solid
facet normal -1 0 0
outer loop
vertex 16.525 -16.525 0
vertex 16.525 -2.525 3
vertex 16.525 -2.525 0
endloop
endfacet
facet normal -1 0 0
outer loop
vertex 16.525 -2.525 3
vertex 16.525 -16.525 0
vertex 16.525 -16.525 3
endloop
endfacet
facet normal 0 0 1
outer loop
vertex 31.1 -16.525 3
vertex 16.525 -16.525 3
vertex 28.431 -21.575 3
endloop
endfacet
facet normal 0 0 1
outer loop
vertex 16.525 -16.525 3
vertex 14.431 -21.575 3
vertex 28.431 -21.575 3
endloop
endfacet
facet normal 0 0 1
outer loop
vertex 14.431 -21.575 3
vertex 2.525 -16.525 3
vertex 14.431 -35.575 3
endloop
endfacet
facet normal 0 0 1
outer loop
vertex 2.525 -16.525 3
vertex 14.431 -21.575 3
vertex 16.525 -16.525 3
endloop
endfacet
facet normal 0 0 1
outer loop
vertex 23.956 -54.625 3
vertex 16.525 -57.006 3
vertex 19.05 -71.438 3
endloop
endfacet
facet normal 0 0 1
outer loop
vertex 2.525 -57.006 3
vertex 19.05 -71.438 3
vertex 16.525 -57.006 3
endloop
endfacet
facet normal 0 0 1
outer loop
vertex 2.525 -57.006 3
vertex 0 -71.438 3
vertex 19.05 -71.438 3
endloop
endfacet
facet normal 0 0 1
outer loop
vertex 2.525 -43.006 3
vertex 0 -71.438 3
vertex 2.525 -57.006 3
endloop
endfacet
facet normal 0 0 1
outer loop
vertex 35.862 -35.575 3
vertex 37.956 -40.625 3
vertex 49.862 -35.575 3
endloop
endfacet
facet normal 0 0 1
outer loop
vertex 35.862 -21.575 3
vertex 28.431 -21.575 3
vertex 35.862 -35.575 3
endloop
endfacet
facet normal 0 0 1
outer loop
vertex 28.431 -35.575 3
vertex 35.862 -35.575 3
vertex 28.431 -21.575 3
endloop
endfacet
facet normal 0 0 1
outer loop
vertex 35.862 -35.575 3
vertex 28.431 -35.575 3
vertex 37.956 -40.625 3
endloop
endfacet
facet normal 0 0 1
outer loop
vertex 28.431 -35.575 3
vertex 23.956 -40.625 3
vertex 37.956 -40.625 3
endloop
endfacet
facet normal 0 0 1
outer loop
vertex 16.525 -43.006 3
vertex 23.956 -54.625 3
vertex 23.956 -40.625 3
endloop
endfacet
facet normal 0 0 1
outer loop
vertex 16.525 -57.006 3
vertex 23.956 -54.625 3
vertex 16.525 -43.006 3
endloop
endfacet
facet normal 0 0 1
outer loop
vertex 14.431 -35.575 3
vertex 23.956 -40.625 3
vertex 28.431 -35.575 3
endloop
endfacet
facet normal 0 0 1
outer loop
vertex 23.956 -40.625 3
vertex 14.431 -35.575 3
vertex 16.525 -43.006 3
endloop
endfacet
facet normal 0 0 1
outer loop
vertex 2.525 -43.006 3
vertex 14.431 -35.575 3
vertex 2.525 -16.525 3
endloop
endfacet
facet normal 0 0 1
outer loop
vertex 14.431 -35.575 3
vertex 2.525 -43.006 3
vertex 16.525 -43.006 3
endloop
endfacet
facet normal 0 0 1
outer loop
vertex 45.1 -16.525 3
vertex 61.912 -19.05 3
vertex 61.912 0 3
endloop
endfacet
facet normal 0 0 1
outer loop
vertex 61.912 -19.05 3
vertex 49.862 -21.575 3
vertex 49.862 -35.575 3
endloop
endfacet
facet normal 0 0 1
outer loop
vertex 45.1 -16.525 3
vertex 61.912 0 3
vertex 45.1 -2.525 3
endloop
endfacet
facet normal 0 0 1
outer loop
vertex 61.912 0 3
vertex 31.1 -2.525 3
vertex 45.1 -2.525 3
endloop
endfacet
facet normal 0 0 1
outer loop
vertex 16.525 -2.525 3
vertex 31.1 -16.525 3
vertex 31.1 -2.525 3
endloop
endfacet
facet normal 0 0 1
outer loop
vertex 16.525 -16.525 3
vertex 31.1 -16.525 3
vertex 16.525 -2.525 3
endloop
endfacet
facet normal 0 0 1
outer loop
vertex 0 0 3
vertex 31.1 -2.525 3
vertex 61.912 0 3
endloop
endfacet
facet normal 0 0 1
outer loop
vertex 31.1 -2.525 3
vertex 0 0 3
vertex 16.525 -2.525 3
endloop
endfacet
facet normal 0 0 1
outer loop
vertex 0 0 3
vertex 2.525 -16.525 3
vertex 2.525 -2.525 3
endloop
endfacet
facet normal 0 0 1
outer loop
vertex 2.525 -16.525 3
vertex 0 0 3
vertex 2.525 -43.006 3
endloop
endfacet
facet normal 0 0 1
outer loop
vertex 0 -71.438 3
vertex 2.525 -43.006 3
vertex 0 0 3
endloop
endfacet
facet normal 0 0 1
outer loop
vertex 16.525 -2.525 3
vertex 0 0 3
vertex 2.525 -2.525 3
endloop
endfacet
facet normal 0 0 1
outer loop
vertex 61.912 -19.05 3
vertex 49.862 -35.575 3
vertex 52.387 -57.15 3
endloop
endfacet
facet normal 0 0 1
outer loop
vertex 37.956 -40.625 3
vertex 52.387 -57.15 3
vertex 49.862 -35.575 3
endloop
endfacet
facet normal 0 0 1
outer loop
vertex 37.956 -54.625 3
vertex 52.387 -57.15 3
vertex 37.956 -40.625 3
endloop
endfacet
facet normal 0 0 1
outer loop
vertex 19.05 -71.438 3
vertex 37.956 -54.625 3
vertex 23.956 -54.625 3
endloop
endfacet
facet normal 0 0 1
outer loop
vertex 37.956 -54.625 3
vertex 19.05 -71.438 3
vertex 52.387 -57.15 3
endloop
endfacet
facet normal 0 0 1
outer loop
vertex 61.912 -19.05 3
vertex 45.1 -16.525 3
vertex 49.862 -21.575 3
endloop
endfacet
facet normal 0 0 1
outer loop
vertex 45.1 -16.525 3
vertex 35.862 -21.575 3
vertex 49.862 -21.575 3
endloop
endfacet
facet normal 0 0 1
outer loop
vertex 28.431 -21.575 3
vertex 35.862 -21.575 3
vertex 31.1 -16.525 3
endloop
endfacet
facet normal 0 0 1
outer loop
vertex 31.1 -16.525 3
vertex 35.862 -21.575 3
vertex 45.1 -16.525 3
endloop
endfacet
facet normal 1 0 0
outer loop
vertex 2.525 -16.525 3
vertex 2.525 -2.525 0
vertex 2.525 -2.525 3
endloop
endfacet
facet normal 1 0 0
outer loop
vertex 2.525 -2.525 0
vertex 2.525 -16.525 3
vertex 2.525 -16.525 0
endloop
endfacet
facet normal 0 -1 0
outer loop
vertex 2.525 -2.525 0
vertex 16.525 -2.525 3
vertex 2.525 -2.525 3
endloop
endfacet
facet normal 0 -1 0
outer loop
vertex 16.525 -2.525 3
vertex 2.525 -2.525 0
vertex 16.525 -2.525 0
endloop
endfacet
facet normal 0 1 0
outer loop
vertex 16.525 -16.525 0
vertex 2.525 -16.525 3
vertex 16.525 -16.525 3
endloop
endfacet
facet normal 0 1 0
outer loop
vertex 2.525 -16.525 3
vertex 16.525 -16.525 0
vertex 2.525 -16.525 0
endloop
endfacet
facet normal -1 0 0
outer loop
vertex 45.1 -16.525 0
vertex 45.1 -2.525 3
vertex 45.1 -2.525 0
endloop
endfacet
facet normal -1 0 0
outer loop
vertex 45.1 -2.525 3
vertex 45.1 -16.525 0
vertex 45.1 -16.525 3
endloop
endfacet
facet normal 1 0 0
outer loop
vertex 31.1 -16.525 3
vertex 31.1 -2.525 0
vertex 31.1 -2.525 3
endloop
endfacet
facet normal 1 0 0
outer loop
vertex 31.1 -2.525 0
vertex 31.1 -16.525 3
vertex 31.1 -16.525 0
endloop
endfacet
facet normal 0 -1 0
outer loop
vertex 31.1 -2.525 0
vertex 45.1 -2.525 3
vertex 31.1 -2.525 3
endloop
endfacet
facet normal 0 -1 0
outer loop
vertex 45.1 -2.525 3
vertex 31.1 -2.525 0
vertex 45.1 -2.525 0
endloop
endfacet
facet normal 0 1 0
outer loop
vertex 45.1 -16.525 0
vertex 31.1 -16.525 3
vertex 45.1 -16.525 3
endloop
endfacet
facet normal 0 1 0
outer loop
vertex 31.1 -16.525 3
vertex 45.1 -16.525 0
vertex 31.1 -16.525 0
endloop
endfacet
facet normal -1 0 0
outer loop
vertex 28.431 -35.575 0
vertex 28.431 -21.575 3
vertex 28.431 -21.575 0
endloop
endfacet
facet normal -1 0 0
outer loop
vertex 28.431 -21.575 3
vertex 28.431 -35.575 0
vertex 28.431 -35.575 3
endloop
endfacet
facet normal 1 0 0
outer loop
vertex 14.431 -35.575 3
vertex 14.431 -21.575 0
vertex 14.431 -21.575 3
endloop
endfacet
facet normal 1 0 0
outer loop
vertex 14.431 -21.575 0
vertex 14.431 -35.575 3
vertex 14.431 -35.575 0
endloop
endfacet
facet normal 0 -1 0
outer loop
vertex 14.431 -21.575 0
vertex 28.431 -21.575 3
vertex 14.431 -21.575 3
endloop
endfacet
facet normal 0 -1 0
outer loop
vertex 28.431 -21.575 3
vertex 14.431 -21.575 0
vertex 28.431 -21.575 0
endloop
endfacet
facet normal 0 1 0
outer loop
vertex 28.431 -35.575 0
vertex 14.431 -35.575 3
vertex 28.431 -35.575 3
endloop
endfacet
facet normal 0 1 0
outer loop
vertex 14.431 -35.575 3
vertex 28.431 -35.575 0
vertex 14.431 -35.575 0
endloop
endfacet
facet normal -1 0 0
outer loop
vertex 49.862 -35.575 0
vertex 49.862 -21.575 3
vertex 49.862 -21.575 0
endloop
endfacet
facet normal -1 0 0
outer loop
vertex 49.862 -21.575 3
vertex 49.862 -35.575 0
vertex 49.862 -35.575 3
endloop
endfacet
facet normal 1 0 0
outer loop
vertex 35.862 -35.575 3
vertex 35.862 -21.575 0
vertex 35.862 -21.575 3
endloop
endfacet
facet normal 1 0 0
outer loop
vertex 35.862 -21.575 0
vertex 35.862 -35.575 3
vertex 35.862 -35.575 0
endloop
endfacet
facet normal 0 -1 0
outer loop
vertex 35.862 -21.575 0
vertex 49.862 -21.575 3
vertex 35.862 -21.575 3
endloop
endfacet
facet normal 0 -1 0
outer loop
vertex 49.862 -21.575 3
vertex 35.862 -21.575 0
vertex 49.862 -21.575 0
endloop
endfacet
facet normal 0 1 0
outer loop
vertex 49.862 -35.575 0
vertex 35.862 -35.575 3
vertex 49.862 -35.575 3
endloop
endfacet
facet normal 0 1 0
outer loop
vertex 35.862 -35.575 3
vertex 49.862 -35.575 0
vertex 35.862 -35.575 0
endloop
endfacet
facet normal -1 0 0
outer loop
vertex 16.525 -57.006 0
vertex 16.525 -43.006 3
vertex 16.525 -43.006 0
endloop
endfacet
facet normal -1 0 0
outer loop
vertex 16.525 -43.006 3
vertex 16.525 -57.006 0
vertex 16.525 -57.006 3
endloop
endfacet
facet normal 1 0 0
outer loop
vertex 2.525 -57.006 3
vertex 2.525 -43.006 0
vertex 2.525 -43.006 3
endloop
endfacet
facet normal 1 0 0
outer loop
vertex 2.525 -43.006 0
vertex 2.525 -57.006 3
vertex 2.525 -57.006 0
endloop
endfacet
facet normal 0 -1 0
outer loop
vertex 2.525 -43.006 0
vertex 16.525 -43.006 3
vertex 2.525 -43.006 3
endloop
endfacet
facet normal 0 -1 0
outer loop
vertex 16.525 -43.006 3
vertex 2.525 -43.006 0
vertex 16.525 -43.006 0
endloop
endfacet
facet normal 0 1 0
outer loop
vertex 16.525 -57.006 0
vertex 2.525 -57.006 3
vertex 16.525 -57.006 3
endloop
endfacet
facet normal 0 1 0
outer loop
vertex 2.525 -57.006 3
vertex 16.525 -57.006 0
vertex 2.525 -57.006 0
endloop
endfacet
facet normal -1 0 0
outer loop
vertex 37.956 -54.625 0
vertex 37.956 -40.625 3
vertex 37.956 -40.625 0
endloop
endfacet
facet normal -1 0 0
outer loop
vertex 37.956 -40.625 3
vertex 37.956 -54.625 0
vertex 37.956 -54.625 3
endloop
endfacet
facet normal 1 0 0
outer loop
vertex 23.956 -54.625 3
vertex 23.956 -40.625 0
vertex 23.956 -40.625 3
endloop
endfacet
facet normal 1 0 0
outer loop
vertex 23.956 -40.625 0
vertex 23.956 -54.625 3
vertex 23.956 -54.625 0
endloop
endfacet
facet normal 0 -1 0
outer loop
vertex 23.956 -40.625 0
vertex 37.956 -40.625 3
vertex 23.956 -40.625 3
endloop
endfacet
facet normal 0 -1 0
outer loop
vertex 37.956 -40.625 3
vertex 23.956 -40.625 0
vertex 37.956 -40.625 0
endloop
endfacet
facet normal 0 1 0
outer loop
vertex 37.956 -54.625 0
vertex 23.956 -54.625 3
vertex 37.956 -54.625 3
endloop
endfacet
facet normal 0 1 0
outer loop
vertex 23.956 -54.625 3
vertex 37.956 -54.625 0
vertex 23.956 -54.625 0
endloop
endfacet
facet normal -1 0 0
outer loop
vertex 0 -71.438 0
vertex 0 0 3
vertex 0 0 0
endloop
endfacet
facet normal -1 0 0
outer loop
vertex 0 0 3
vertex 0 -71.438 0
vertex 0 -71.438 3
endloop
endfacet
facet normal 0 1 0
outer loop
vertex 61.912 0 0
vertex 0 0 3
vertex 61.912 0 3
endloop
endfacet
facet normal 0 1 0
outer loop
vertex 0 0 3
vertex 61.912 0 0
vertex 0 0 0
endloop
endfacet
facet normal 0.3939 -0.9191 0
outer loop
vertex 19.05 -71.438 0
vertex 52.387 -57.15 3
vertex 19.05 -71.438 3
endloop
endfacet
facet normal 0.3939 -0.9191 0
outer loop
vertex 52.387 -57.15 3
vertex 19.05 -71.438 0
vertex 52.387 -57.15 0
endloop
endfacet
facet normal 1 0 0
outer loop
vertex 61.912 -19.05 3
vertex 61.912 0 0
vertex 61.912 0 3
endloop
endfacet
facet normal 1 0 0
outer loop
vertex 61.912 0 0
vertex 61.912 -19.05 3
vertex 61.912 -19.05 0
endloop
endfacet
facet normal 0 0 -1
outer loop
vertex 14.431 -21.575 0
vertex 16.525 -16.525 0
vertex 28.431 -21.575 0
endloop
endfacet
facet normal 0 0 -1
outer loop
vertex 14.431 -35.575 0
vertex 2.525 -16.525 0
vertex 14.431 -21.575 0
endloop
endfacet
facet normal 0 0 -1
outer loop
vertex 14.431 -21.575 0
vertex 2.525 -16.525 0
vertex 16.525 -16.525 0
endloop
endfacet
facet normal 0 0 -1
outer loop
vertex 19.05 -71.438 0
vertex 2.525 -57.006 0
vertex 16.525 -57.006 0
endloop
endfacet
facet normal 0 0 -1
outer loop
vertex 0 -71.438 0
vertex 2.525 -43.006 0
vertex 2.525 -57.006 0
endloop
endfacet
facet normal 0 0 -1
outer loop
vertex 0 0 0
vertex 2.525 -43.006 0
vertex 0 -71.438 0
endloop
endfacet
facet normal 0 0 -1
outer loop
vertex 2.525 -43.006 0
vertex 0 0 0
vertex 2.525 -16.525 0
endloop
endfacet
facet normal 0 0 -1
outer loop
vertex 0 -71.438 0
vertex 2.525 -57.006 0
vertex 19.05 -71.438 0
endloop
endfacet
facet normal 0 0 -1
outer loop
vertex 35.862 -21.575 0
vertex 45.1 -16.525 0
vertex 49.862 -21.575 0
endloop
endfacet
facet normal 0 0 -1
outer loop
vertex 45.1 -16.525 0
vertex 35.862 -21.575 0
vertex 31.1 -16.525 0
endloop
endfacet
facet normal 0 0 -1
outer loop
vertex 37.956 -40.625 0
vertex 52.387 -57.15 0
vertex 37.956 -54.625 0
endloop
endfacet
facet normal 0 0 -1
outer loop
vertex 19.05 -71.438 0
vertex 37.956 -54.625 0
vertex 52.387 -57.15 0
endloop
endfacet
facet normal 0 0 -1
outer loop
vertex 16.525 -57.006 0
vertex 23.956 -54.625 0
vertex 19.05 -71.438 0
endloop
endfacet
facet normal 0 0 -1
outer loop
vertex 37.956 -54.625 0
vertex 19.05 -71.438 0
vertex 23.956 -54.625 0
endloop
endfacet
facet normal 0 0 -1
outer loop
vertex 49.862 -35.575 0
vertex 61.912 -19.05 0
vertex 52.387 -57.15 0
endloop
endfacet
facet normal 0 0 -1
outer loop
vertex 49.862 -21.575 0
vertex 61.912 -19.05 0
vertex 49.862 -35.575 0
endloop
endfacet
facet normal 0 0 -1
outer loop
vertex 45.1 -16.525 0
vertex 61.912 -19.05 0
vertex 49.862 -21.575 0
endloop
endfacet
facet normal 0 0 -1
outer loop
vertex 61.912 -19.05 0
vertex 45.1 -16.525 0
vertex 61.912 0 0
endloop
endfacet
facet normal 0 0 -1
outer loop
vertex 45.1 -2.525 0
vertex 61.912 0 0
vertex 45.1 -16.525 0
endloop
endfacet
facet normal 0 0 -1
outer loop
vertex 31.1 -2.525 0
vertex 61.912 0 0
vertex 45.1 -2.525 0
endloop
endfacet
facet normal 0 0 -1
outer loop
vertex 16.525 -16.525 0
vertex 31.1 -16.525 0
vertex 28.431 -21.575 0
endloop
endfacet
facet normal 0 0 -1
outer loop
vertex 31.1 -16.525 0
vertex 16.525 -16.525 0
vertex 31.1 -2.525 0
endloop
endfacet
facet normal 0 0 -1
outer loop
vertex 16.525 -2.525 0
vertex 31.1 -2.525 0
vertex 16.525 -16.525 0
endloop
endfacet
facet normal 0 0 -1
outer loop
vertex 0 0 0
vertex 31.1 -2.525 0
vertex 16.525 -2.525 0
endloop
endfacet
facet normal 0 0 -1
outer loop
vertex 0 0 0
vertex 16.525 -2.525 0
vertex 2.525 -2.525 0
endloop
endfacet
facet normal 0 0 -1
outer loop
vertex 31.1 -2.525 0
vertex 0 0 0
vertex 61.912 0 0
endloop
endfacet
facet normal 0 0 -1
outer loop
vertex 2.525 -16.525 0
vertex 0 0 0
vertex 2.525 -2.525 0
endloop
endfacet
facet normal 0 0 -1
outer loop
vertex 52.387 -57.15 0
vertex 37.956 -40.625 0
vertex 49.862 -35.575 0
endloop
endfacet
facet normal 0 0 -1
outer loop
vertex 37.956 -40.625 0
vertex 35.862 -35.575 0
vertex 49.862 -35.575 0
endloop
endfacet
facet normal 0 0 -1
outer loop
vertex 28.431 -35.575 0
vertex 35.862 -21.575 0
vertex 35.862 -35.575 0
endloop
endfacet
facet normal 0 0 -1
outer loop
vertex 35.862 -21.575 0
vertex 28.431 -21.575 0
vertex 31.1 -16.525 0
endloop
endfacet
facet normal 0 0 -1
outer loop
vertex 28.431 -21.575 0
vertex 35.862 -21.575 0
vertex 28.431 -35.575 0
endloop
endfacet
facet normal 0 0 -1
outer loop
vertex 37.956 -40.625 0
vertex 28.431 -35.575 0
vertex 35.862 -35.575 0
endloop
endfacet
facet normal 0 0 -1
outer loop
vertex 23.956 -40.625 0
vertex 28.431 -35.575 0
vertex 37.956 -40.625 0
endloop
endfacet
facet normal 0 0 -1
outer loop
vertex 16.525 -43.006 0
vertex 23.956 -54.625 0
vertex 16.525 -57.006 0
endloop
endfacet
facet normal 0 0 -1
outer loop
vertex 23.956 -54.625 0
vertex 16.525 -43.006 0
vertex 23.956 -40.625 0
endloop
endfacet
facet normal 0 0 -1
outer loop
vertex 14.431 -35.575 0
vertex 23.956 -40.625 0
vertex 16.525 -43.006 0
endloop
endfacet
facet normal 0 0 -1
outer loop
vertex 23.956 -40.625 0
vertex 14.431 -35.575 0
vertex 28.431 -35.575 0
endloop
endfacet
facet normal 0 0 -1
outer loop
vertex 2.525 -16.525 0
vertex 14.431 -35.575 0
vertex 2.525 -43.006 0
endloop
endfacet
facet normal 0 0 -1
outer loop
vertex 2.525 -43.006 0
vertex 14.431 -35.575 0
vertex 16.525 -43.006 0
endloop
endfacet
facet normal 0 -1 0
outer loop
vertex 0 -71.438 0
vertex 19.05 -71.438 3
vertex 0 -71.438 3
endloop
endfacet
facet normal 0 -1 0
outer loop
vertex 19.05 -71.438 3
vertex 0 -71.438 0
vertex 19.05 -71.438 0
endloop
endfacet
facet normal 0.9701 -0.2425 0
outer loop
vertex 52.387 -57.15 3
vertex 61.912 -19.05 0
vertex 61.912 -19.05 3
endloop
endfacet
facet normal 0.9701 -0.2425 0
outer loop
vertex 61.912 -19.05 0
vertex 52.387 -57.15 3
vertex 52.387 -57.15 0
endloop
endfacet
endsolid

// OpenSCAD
$fn = $preview ? 0 : 100;


difference(){
	difference() {
		union() {
			linear_extrude(height = 3) {
				polygon(points = [[0.0, -71.4375], [0.0, 0.0], [61.9125, 0.0], [61.9125, -19.05], [52.3875, -57.150000000000006], [19.05, -71.4375], [0.0, -71.4375]]);
			}
		}
	}
	/* Holes Below*/
	union(){
		translate(v = [9.5250000000, -9.5250000000, 0]) {
			cube(center = true, size = [14, 14, 6]);
		}
		translate(v = [38.1000000000, -9.5250000000, 0]) {
			cube(center = true, size = [14, 14, 6]);
		}
		translate(v = [21.4312500000, -28.5750000000, 0]) {
			cube(center = true, size = [14, 14, 6]);
		}
		translate(v = [42.8625000000, -28.5750000000, 0]) {
			cube(center = true, size = [14, 14, 6]);
		}
		translate(v = [9.5250000000, -50.0062500000, 0]) {
			cube(center = true, size = [14, 14, 6]);
		}
		translate(v = [30.9562500000, -47.6250000000, 0]) {
			cube(center = true, size = [14, 14, 6]);
		}
	} /* End Holes */ 
}
